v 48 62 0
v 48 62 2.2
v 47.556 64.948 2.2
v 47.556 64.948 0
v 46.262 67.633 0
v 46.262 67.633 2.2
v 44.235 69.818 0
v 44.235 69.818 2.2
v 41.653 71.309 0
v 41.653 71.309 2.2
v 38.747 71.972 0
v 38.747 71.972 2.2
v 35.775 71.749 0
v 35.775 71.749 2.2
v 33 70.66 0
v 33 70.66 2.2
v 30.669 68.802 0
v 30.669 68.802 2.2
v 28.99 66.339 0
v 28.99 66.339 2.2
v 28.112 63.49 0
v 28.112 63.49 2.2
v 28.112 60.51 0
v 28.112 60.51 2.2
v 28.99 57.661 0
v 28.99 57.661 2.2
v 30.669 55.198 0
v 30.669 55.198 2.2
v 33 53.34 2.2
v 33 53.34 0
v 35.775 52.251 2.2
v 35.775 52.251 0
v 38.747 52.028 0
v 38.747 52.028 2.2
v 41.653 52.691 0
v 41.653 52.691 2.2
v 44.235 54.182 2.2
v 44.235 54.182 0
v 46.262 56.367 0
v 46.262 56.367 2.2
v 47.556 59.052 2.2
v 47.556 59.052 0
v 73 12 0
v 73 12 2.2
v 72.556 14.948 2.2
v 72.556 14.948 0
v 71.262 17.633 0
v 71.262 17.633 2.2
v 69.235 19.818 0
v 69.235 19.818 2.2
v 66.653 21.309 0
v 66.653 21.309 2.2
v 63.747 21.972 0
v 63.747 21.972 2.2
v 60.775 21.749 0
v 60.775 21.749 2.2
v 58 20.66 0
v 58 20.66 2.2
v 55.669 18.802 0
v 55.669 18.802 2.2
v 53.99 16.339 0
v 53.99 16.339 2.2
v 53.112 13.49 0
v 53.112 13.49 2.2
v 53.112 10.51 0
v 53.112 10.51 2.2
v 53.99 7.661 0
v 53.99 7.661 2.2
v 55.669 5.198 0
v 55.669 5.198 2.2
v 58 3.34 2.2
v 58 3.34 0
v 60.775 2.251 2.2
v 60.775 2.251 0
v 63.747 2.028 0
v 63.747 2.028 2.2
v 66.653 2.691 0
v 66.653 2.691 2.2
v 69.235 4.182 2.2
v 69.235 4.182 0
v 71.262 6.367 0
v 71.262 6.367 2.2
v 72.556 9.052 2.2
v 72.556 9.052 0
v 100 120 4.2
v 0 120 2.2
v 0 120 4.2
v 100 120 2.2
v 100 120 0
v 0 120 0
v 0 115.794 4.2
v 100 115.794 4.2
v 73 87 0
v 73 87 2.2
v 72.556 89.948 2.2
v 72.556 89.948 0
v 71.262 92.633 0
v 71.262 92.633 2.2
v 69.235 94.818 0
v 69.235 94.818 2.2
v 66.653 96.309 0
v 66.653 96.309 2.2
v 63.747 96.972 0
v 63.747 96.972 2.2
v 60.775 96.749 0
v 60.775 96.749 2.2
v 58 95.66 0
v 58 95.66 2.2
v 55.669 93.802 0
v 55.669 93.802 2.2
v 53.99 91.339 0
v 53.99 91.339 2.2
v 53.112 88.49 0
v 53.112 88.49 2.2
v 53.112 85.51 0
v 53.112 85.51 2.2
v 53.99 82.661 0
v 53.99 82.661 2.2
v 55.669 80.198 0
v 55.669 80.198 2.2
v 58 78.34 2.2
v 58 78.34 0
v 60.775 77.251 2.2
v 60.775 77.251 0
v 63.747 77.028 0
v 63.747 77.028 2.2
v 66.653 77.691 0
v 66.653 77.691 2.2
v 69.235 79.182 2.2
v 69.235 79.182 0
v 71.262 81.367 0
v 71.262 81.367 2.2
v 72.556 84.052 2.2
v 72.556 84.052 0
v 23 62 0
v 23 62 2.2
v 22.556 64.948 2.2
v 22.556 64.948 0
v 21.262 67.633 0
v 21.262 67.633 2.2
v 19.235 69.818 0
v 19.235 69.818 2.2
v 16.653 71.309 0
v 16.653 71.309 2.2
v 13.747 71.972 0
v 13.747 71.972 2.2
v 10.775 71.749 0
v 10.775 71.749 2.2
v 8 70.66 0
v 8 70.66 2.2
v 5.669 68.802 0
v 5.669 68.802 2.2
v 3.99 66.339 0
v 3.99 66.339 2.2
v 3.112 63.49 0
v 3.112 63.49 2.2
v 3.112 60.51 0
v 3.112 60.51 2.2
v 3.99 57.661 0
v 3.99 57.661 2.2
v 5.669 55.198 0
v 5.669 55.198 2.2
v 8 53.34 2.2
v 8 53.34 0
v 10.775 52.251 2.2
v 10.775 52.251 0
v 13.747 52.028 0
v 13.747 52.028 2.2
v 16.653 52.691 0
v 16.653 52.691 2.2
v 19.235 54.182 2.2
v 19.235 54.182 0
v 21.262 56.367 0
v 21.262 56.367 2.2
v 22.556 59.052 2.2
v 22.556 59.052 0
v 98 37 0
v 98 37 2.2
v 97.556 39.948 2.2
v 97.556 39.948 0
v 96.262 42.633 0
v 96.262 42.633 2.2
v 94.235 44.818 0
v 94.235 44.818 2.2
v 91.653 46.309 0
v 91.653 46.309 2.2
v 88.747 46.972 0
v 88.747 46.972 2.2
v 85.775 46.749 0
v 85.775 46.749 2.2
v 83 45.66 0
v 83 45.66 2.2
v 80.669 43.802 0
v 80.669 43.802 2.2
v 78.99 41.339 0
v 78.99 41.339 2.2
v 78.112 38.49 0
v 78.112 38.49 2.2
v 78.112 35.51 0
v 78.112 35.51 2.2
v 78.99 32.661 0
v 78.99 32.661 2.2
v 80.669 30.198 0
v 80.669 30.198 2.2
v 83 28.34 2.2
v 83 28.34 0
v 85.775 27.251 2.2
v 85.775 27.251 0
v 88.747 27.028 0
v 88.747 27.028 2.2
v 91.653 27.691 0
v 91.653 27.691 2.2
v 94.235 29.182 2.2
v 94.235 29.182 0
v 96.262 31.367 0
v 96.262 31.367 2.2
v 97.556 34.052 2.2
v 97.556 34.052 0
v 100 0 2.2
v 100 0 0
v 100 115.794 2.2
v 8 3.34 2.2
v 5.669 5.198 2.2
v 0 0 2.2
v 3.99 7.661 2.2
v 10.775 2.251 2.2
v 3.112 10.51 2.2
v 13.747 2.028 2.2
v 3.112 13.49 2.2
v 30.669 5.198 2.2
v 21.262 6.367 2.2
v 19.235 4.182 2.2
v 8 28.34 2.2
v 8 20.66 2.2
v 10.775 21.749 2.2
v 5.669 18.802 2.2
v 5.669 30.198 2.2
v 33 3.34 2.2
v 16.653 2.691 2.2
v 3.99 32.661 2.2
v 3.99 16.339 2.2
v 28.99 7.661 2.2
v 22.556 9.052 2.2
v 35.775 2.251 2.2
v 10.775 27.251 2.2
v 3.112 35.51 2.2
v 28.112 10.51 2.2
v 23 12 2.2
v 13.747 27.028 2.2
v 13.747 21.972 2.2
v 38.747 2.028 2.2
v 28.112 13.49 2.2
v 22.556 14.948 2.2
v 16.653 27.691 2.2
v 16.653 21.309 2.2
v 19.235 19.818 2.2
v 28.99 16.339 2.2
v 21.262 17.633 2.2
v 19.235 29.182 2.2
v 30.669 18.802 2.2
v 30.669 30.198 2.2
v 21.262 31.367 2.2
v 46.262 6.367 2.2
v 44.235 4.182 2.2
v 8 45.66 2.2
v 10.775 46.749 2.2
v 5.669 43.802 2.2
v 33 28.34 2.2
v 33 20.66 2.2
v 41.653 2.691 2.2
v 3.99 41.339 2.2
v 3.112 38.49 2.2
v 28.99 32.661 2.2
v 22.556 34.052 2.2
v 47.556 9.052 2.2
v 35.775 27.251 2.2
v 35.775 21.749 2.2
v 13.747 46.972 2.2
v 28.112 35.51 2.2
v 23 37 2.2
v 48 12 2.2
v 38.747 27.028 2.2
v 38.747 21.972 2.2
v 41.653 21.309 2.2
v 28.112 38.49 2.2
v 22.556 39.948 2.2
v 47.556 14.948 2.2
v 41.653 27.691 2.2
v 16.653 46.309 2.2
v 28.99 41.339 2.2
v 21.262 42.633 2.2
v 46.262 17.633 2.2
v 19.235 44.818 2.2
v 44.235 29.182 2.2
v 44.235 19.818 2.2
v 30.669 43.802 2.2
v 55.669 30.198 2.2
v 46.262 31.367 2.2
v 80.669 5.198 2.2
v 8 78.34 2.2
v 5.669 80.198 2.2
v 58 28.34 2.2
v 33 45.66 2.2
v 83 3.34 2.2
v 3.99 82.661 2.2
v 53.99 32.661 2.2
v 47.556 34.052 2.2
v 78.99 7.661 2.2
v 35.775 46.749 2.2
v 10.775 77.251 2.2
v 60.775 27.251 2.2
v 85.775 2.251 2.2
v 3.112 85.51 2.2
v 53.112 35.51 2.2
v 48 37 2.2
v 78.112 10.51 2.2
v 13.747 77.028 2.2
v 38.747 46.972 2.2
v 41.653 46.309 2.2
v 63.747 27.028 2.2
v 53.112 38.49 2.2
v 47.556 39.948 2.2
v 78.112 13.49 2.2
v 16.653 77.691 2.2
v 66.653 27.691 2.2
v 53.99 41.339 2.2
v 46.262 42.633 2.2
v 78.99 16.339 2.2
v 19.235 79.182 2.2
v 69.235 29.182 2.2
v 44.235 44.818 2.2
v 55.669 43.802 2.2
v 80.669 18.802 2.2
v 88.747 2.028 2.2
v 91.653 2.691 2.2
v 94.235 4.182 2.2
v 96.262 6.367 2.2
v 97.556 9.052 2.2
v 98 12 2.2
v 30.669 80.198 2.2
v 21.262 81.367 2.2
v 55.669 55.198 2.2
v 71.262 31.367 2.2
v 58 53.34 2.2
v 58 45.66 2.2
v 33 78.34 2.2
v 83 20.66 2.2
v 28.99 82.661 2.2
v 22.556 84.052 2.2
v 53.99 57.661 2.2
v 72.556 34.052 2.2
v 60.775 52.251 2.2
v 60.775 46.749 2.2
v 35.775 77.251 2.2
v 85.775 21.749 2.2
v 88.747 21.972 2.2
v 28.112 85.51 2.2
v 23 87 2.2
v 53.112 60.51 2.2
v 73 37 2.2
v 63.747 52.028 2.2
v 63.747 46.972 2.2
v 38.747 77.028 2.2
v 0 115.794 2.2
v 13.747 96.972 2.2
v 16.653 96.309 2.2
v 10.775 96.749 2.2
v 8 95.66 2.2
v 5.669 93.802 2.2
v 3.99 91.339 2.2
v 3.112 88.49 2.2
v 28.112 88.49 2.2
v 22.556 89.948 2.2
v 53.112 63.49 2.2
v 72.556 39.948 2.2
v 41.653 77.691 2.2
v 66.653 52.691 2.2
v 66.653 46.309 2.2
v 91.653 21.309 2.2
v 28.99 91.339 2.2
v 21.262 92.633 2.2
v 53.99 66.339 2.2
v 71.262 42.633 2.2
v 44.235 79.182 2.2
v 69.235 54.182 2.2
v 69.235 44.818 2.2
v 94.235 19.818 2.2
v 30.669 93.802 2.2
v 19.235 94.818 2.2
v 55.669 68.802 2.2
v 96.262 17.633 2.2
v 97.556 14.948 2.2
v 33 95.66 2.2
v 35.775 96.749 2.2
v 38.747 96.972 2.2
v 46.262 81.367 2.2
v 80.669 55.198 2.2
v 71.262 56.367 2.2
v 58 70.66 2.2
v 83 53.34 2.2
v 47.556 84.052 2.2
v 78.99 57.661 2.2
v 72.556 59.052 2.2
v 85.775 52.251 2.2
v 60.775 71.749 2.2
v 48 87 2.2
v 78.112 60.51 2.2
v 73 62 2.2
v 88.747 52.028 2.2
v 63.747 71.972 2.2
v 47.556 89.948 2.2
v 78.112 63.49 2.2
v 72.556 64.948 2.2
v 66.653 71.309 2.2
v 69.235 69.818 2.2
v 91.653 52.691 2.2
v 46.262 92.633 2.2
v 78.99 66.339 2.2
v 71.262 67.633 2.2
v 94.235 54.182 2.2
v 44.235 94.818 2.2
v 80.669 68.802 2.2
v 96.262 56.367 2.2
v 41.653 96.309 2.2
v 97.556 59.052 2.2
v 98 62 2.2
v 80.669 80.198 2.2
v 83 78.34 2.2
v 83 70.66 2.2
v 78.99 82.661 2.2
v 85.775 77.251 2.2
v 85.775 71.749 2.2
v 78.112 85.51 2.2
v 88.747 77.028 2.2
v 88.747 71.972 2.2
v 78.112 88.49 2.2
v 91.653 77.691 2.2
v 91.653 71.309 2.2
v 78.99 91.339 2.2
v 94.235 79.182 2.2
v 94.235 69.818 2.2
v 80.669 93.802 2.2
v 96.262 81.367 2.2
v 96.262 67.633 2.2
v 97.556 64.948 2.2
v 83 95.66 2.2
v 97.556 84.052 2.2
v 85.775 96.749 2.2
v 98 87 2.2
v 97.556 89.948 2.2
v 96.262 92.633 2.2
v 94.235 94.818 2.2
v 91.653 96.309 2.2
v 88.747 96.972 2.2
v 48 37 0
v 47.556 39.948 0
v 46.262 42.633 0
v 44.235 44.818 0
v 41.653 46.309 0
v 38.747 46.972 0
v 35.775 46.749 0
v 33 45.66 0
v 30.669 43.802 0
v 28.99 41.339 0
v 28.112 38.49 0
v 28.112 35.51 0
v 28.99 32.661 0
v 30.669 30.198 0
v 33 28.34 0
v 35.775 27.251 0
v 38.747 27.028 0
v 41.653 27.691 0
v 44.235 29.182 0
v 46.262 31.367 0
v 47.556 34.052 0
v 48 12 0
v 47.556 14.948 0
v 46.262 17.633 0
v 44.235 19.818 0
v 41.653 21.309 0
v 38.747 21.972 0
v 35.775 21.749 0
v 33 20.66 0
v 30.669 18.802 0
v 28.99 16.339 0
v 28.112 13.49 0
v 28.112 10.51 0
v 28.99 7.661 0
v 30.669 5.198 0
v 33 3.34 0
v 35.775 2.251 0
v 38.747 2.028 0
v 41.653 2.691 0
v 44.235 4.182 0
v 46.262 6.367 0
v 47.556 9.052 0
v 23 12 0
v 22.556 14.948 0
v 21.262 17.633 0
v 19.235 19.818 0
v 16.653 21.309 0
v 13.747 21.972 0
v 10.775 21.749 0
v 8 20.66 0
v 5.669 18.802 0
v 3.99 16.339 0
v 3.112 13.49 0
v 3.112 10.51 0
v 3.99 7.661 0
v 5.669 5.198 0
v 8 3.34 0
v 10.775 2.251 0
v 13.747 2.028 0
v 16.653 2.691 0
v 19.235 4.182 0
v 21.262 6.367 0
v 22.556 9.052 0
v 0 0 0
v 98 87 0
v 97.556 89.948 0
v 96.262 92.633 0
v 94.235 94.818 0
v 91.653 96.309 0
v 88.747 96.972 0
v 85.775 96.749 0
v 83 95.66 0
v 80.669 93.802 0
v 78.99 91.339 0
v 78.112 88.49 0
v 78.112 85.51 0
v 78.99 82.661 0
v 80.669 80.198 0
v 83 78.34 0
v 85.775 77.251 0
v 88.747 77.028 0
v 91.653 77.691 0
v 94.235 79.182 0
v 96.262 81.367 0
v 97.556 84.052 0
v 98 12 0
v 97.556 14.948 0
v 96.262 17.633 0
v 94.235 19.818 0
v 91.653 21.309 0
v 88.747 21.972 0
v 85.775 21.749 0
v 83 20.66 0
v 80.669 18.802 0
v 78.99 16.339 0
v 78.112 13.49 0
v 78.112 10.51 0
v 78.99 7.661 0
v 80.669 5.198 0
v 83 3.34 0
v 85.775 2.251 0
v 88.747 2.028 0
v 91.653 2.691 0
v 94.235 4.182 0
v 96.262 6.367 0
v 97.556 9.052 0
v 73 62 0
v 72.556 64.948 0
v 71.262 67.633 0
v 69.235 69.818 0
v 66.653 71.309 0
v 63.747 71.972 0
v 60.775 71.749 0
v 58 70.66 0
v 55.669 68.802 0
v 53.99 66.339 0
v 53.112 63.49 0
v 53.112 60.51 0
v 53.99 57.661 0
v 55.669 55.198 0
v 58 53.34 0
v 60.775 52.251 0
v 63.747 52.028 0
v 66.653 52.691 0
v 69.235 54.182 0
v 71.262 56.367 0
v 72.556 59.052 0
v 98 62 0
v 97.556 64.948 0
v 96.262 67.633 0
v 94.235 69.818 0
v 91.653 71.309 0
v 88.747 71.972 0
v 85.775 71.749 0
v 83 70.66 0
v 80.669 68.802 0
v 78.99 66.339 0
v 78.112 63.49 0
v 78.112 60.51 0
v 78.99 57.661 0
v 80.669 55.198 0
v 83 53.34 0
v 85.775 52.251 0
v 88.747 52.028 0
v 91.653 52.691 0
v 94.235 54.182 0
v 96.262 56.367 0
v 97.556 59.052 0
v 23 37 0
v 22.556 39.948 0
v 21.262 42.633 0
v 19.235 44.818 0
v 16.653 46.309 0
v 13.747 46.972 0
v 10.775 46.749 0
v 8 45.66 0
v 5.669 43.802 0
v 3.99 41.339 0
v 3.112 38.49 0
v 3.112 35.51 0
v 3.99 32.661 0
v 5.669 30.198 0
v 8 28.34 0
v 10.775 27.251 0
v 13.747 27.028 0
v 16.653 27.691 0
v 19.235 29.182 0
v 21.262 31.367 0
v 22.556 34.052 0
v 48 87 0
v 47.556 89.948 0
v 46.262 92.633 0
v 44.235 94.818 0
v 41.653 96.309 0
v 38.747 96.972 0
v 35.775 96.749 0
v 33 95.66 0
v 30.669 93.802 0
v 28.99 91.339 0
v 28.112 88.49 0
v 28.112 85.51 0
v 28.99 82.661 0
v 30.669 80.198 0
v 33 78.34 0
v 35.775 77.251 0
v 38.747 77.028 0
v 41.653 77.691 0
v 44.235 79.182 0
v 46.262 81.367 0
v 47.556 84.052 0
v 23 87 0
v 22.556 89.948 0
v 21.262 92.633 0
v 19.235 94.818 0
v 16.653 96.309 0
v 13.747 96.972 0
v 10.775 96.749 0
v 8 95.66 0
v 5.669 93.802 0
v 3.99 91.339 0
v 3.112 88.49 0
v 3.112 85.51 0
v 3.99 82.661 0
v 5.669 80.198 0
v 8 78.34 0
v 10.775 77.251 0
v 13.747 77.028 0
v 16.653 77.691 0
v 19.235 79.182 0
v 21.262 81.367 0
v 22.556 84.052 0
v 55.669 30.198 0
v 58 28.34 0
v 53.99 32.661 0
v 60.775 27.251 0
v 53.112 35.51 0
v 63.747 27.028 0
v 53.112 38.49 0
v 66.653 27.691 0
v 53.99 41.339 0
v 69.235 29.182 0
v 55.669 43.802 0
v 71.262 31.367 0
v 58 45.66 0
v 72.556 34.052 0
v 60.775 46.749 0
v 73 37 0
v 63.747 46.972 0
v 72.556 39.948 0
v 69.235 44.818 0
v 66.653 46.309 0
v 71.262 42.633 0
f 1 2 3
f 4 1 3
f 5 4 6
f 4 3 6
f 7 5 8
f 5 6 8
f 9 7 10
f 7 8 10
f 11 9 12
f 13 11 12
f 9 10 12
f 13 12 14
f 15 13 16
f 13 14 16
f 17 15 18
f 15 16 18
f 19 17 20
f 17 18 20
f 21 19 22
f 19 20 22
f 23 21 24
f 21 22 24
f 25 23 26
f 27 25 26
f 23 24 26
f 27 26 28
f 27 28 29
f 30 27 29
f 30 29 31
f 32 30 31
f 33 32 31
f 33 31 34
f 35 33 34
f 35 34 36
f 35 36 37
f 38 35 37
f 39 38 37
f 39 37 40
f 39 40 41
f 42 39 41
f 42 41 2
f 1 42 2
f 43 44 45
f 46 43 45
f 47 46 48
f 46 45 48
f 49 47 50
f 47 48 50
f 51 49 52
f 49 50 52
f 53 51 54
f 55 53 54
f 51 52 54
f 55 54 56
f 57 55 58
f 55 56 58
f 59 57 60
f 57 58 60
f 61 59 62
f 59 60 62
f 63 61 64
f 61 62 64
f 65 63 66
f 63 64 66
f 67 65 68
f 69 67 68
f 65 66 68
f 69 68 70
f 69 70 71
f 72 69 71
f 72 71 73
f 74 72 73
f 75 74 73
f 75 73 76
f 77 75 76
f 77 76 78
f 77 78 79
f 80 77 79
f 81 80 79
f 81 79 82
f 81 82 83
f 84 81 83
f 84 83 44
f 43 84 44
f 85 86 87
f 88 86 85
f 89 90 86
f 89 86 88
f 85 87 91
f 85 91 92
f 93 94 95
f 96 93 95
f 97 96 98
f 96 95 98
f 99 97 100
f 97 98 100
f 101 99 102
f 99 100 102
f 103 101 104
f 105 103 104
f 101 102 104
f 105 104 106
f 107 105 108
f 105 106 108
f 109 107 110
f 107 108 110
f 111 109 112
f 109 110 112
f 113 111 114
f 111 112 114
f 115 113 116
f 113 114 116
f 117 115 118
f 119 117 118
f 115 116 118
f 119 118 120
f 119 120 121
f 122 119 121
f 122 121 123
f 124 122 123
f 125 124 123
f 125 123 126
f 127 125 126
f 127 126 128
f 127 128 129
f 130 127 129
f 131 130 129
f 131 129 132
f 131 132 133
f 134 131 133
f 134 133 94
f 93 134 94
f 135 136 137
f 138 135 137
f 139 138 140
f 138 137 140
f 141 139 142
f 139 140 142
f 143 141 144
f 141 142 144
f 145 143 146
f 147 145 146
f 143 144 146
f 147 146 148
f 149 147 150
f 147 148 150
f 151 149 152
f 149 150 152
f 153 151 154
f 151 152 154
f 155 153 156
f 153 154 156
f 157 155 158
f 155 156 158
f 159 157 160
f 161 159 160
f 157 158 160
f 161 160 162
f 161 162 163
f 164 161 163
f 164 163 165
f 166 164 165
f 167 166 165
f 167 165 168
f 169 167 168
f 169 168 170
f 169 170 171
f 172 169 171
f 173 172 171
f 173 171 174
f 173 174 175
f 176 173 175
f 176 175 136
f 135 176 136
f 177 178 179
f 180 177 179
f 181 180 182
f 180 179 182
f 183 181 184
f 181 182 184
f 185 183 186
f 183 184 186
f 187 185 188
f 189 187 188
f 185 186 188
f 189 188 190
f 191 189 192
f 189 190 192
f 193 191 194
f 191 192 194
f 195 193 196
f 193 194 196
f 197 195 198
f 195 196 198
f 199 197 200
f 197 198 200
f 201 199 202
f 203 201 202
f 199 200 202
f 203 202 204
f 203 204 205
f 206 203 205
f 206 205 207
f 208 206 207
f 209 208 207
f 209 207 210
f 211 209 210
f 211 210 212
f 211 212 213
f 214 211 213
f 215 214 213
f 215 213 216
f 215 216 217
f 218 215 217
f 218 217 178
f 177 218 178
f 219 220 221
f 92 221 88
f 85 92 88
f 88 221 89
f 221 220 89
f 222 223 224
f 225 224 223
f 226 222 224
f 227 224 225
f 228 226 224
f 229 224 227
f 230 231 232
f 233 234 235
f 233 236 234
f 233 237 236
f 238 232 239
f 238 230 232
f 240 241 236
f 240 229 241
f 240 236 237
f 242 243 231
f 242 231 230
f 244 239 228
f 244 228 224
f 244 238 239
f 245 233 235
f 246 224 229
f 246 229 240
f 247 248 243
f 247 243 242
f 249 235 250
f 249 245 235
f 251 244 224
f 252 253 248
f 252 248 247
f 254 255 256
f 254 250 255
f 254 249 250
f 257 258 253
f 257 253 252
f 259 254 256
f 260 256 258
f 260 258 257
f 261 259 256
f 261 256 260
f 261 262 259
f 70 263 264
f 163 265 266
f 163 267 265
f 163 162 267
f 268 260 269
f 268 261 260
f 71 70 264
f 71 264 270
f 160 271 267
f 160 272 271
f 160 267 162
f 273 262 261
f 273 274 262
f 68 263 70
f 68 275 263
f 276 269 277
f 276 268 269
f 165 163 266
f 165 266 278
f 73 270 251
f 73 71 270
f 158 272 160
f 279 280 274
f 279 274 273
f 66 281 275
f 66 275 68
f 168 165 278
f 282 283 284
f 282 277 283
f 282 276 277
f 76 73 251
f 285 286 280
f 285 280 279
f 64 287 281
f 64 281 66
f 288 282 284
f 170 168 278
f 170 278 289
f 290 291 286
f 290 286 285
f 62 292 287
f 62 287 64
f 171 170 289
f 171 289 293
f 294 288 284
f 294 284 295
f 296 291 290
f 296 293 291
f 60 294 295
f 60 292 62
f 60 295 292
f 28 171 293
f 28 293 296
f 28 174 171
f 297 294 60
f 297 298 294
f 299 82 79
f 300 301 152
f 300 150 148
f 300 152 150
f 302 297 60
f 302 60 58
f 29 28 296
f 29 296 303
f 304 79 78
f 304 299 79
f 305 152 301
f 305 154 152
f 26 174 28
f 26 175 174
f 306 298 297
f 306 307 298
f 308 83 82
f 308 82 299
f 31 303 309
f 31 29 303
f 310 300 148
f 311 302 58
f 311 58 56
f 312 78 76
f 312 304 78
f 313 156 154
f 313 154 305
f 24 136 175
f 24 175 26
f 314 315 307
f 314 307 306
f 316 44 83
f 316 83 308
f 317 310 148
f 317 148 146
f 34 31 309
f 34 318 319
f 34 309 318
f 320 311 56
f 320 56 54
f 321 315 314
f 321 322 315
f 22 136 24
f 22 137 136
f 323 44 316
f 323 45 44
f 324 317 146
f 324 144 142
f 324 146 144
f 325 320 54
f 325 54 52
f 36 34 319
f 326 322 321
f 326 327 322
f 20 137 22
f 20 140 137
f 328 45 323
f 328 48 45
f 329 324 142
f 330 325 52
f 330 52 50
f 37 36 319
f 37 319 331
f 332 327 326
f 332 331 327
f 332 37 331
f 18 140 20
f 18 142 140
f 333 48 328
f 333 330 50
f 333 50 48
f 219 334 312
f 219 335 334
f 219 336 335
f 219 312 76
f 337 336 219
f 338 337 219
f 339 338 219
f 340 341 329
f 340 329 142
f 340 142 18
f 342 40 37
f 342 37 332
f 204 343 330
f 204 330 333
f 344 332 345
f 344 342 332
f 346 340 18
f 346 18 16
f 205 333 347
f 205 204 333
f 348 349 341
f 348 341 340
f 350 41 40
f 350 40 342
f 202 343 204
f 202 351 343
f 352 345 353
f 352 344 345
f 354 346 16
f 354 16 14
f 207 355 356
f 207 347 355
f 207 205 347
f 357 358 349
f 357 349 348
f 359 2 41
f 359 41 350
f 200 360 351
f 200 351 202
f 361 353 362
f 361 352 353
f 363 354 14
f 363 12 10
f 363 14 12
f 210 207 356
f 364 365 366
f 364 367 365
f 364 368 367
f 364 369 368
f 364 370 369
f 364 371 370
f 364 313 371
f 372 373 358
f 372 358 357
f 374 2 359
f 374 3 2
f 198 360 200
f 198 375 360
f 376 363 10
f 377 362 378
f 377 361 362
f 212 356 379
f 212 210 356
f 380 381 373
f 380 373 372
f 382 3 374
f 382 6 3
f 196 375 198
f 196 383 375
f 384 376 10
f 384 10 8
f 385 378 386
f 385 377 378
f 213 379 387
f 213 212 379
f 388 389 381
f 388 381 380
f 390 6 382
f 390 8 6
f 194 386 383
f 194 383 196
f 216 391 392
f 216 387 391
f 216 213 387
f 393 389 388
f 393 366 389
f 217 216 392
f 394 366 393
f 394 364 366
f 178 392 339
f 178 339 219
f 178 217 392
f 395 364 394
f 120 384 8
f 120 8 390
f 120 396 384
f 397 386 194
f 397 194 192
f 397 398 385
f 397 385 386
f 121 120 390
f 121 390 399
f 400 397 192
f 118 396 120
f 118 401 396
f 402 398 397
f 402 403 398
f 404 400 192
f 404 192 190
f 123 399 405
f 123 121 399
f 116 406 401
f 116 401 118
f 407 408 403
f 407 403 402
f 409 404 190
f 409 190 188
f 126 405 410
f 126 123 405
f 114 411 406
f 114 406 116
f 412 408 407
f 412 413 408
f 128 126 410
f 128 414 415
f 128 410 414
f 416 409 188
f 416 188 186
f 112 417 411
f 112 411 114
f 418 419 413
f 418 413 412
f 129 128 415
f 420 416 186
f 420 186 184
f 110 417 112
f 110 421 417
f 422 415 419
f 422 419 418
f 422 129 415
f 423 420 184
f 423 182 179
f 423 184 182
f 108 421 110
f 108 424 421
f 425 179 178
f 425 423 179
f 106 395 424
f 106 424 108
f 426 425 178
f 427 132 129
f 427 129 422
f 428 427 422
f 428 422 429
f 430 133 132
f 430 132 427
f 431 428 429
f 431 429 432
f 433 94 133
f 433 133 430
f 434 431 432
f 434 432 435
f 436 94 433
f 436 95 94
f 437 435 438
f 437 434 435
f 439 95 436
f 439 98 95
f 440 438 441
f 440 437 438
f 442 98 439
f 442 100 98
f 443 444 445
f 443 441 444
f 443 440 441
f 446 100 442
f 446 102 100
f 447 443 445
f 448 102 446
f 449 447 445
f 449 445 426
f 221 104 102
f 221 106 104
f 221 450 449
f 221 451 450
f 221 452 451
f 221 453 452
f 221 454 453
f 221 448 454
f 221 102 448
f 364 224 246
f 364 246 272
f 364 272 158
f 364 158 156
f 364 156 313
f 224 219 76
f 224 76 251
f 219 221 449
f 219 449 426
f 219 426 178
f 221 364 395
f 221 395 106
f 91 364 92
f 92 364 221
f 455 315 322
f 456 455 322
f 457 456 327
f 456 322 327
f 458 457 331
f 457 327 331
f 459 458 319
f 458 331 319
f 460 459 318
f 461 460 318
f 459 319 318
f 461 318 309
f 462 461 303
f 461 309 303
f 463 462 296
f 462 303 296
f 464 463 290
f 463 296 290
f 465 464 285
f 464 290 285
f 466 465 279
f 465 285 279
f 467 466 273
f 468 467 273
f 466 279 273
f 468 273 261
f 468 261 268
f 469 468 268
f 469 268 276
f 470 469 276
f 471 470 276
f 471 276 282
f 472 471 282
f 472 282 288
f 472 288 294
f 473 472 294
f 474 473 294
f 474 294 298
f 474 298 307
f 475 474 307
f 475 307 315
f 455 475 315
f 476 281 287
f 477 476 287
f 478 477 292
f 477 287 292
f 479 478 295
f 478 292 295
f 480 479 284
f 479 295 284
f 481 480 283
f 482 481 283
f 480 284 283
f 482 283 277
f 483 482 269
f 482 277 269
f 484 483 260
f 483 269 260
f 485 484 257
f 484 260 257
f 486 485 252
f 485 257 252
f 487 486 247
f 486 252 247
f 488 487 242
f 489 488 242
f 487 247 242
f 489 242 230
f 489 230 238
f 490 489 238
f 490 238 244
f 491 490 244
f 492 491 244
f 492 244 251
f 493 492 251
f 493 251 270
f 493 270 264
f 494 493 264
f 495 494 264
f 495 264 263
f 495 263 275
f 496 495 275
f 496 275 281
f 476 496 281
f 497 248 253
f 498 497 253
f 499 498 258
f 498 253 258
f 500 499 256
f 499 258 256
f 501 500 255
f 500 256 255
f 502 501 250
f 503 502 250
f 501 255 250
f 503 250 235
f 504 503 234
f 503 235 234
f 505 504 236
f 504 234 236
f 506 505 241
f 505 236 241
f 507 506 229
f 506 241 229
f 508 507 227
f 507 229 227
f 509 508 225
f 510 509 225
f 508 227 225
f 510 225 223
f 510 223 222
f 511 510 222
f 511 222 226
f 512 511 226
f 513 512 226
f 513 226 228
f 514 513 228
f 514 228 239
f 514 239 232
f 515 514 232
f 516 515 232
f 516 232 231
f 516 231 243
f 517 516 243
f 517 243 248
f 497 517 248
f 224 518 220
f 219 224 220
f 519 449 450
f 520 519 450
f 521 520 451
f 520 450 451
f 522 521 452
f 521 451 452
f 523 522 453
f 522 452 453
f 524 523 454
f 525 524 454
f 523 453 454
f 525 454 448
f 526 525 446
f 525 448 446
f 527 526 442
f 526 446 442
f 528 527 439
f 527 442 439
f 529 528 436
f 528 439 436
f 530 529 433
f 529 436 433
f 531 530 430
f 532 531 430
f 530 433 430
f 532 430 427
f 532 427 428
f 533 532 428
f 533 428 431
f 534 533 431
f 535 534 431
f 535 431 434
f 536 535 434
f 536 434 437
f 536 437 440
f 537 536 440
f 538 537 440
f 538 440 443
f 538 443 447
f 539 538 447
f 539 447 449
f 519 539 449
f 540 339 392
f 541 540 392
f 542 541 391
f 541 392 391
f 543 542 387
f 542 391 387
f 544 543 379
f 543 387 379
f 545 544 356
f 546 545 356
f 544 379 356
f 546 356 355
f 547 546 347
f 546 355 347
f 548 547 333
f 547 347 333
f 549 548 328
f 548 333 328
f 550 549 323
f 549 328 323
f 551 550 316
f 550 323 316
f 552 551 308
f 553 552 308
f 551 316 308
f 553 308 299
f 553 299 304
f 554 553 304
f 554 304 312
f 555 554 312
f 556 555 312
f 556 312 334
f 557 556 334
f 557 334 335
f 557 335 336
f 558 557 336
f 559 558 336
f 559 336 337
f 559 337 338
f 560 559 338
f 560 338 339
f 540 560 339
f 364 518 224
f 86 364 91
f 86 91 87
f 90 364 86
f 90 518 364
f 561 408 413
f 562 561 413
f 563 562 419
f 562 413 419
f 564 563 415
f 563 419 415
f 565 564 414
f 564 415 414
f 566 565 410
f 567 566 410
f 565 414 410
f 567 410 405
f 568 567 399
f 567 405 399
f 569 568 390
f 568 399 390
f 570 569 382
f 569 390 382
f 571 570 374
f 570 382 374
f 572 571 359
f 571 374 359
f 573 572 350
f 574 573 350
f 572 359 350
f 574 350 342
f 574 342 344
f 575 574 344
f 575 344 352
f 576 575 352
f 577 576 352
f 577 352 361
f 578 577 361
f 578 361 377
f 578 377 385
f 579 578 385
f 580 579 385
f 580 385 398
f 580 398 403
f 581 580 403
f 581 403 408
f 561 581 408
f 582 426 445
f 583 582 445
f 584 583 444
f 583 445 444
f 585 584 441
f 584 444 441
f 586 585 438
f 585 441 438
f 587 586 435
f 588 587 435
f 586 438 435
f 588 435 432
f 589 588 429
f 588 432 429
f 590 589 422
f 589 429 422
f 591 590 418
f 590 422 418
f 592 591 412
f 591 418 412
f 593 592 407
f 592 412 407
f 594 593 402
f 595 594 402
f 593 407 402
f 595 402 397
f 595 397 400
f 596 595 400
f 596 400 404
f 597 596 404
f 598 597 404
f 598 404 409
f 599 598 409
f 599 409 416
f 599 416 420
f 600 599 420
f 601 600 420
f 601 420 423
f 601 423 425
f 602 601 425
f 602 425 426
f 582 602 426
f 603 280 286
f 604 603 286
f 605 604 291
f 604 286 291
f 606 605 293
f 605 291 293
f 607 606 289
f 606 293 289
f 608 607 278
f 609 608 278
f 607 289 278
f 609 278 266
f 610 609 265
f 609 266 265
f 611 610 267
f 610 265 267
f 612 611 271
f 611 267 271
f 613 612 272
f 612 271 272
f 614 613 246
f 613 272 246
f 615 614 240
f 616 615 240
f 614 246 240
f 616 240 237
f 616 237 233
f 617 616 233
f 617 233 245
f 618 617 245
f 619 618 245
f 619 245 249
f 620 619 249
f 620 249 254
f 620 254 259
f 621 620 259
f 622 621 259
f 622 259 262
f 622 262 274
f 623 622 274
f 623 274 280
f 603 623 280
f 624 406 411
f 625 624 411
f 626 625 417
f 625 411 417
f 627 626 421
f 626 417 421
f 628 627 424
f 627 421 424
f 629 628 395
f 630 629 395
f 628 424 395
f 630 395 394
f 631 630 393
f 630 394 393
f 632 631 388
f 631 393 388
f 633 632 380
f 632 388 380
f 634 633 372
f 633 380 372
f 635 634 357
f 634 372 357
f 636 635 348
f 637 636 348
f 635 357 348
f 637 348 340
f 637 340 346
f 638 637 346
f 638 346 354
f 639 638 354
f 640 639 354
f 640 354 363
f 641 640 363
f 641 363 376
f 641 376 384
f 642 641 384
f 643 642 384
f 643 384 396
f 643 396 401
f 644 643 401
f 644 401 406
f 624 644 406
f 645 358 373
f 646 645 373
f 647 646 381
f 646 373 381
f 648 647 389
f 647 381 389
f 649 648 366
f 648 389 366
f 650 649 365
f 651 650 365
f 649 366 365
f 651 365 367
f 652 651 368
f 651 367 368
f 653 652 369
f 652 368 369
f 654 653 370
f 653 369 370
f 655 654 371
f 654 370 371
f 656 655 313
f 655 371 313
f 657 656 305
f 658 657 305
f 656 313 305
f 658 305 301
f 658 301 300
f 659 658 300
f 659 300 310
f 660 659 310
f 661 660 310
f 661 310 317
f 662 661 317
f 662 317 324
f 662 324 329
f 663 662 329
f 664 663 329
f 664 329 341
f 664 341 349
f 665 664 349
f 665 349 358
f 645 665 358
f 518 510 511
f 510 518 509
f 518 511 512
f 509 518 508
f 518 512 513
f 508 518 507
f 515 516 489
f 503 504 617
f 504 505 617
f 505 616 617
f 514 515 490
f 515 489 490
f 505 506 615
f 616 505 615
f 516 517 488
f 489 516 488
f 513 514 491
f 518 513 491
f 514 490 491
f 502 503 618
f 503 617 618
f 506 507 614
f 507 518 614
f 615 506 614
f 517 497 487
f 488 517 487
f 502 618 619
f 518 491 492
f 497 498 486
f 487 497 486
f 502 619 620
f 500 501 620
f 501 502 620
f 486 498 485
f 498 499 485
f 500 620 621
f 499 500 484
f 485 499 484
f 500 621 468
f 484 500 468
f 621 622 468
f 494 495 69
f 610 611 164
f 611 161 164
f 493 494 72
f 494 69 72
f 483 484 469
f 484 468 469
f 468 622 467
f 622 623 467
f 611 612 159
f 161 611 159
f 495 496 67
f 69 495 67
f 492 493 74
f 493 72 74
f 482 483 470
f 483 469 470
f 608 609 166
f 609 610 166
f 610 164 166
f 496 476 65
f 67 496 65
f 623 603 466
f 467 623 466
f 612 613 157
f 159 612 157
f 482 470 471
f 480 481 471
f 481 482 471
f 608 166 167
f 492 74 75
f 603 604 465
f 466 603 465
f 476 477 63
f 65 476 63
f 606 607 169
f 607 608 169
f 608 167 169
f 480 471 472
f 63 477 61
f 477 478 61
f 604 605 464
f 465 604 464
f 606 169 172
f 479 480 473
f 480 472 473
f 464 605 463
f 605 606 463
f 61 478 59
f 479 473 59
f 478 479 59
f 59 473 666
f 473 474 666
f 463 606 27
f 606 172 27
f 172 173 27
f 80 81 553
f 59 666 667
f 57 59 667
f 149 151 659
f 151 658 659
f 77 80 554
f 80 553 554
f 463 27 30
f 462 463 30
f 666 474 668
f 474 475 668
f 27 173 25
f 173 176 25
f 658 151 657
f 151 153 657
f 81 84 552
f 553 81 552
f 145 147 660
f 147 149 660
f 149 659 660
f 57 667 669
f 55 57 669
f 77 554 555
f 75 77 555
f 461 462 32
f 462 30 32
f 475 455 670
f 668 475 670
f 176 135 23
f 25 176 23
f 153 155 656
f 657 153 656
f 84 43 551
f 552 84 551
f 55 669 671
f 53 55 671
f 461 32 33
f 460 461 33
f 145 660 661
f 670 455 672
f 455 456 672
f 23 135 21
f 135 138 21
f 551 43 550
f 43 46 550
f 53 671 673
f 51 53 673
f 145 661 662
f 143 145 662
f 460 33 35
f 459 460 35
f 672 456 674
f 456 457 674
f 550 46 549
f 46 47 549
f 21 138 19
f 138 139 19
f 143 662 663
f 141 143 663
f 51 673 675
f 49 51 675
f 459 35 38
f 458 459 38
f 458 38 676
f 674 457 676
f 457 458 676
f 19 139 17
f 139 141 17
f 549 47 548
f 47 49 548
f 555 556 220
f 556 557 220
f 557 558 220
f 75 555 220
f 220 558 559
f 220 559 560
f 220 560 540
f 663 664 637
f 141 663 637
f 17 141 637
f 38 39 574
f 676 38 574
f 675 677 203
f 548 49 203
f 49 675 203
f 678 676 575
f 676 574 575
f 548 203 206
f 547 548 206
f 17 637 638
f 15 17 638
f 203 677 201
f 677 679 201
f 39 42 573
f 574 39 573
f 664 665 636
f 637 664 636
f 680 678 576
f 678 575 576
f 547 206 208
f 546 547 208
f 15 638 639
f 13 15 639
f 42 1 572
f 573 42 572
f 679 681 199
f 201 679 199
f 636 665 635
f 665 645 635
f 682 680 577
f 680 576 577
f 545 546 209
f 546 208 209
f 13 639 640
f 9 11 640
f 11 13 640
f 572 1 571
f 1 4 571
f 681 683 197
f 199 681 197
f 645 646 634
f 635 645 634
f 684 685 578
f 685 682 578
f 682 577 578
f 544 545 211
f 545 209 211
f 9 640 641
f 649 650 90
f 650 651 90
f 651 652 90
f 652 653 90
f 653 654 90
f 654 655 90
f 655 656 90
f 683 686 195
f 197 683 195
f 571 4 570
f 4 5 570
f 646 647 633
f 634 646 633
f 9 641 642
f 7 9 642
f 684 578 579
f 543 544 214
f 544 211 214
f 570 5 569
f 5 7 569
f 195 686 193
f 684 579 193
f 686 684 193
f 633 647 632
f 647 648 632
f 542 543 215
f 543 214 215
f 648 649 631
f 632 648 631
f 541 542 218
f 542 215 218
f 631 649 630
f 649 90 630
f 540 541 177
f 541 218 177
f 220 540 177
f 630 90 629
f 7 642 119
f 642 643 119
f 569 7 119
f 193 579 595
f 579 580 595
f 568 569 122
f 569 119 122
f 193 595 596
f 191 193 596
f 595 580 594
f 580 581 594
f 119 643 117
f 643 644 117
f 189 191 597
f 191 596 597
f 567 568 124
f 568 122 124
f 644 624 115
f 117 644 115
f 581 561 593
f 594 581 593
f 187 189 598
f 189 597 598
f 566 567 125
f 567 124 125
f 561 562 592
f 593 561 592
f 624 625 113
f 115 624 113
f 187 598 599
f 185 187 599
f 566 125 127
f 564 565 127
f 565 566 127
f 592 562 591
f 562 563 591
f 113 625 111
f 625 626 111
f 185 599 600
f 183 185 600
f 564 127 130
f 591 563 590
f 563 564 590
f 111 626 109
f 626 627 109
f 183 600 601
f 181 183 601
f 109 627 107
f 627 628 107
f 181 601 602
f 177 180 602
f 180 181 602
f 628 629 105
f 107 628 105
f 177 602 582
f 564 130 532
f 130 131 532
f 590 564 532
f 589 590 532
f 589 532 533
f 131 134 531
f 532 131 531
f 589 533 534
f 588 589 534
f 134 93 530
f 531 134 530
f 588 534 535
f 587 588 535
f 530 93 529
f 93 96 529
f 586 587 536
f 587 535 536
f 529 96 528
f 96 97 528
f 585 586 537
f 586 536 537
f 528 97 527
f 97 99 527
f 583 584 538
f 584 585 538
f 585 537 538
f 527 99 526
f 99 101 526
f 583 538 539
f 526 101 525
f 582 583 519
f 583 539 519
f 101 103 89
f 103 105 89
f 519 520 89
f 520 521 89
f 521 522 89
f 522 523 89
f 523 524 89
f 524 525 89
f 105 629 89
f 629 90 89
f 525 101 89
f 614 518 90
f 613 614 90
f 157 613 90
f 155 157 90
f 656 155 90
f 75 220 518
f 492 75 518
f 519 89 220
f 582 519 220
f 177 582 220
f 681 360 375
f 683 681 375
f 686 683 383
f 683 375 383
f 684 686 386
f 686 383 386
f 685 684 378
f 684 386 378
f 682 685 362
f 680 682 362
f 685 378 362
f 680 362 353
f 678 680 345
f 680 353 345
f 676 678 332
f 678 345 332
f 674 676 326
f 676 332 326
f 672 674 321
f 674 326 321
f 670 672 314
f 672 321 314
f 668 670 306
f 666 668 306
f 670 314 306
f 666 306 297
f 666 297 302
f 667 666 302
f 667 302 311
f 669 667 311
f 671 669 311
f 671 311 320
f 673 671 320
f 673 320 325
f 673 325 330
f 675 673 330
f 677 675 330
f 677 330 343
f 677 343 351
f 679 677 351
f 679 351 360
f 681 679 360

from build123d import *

# Parameters (mm, degrees)
SKETCH1_W           = 100
SKETCH1_H           = 120
BOSS_EXTRUDE1_DEPTH = 2.2
SKETCH2_R           = 10
CUT_EXTRUDE1_DEPTH  = 10
SKETCH3_W           = 100
SKETCH3_H           = 4.205559055
BOSS_EXTRUDE2_DEPTH = 2


with BuildPart() as part:
    # Sketch1 → Boss-Extrude1 (new body)
    with BuildSketch(Plane.XY):
        with Locations((50, 60)):
            Rectangle(SKETCH1_W, SKETCH1_H)
    extrude(amount=BOSS_EXTRUDE1_DEPTH)

    # Sketch2 → Cut-Extrude1 (cut)
    with BuildSketch(Plane.XY.offset(2.2)):
        with Locations((88, 12)):
            Circle(SKETCH2_R)
        with Locations((63, 12)):
            Circle(SKETCH2_R)
        with Locations((38, 12)):
            Circle(SKETCH2_R)
        with Locations((13, 12)):
            Circle(SKETCH2_R)
        with Locations((63, 37)):
            Circle(SKETCH2_R)
        with Locations((38, 37)):
            Circle(SKETCH2_R)
        with Locations((13, 37)):
            Circle(SKETCH2_R)
        with Locations((63, 62)):
            Circle(SKETCH2_R)
        with Locations((38, 62)):
            Circle(SKETCH2_R)
        with Locations((13, 62)):
            Circle(SKETCH2_R)
        with Locations((63, 87)):
            Circle(SKETCH2_R)
        with Locations((38, 87)):
            Circle(SKETCH2_R)
        with Locations((13, 87)):
            Circle(SKETCH2_R)
        with Locations((88, 37)):
            Circle(SKETCH2_R)
        with Locations((88, 62)):
            Circle(SKETCH2_R)
        with Locations((88, 87)):
            Circle(SKETCH2_R)
    extrude(amount=-CUT_EXTRUDE1_DEPTH, mode=Mode.SUBTRACT)

    # Sketch3 → Boss-Extrude2 (add)
    with BuildSketch(Plane.XY.offset(2.2)):
        with Locations((50, 117.897220473)):
            Rectangle(SKETCH3_W, SKETCH3_H)
    extrude(amount=BOSS_EXTRUDE2_DEPTH)


solid = part.part
